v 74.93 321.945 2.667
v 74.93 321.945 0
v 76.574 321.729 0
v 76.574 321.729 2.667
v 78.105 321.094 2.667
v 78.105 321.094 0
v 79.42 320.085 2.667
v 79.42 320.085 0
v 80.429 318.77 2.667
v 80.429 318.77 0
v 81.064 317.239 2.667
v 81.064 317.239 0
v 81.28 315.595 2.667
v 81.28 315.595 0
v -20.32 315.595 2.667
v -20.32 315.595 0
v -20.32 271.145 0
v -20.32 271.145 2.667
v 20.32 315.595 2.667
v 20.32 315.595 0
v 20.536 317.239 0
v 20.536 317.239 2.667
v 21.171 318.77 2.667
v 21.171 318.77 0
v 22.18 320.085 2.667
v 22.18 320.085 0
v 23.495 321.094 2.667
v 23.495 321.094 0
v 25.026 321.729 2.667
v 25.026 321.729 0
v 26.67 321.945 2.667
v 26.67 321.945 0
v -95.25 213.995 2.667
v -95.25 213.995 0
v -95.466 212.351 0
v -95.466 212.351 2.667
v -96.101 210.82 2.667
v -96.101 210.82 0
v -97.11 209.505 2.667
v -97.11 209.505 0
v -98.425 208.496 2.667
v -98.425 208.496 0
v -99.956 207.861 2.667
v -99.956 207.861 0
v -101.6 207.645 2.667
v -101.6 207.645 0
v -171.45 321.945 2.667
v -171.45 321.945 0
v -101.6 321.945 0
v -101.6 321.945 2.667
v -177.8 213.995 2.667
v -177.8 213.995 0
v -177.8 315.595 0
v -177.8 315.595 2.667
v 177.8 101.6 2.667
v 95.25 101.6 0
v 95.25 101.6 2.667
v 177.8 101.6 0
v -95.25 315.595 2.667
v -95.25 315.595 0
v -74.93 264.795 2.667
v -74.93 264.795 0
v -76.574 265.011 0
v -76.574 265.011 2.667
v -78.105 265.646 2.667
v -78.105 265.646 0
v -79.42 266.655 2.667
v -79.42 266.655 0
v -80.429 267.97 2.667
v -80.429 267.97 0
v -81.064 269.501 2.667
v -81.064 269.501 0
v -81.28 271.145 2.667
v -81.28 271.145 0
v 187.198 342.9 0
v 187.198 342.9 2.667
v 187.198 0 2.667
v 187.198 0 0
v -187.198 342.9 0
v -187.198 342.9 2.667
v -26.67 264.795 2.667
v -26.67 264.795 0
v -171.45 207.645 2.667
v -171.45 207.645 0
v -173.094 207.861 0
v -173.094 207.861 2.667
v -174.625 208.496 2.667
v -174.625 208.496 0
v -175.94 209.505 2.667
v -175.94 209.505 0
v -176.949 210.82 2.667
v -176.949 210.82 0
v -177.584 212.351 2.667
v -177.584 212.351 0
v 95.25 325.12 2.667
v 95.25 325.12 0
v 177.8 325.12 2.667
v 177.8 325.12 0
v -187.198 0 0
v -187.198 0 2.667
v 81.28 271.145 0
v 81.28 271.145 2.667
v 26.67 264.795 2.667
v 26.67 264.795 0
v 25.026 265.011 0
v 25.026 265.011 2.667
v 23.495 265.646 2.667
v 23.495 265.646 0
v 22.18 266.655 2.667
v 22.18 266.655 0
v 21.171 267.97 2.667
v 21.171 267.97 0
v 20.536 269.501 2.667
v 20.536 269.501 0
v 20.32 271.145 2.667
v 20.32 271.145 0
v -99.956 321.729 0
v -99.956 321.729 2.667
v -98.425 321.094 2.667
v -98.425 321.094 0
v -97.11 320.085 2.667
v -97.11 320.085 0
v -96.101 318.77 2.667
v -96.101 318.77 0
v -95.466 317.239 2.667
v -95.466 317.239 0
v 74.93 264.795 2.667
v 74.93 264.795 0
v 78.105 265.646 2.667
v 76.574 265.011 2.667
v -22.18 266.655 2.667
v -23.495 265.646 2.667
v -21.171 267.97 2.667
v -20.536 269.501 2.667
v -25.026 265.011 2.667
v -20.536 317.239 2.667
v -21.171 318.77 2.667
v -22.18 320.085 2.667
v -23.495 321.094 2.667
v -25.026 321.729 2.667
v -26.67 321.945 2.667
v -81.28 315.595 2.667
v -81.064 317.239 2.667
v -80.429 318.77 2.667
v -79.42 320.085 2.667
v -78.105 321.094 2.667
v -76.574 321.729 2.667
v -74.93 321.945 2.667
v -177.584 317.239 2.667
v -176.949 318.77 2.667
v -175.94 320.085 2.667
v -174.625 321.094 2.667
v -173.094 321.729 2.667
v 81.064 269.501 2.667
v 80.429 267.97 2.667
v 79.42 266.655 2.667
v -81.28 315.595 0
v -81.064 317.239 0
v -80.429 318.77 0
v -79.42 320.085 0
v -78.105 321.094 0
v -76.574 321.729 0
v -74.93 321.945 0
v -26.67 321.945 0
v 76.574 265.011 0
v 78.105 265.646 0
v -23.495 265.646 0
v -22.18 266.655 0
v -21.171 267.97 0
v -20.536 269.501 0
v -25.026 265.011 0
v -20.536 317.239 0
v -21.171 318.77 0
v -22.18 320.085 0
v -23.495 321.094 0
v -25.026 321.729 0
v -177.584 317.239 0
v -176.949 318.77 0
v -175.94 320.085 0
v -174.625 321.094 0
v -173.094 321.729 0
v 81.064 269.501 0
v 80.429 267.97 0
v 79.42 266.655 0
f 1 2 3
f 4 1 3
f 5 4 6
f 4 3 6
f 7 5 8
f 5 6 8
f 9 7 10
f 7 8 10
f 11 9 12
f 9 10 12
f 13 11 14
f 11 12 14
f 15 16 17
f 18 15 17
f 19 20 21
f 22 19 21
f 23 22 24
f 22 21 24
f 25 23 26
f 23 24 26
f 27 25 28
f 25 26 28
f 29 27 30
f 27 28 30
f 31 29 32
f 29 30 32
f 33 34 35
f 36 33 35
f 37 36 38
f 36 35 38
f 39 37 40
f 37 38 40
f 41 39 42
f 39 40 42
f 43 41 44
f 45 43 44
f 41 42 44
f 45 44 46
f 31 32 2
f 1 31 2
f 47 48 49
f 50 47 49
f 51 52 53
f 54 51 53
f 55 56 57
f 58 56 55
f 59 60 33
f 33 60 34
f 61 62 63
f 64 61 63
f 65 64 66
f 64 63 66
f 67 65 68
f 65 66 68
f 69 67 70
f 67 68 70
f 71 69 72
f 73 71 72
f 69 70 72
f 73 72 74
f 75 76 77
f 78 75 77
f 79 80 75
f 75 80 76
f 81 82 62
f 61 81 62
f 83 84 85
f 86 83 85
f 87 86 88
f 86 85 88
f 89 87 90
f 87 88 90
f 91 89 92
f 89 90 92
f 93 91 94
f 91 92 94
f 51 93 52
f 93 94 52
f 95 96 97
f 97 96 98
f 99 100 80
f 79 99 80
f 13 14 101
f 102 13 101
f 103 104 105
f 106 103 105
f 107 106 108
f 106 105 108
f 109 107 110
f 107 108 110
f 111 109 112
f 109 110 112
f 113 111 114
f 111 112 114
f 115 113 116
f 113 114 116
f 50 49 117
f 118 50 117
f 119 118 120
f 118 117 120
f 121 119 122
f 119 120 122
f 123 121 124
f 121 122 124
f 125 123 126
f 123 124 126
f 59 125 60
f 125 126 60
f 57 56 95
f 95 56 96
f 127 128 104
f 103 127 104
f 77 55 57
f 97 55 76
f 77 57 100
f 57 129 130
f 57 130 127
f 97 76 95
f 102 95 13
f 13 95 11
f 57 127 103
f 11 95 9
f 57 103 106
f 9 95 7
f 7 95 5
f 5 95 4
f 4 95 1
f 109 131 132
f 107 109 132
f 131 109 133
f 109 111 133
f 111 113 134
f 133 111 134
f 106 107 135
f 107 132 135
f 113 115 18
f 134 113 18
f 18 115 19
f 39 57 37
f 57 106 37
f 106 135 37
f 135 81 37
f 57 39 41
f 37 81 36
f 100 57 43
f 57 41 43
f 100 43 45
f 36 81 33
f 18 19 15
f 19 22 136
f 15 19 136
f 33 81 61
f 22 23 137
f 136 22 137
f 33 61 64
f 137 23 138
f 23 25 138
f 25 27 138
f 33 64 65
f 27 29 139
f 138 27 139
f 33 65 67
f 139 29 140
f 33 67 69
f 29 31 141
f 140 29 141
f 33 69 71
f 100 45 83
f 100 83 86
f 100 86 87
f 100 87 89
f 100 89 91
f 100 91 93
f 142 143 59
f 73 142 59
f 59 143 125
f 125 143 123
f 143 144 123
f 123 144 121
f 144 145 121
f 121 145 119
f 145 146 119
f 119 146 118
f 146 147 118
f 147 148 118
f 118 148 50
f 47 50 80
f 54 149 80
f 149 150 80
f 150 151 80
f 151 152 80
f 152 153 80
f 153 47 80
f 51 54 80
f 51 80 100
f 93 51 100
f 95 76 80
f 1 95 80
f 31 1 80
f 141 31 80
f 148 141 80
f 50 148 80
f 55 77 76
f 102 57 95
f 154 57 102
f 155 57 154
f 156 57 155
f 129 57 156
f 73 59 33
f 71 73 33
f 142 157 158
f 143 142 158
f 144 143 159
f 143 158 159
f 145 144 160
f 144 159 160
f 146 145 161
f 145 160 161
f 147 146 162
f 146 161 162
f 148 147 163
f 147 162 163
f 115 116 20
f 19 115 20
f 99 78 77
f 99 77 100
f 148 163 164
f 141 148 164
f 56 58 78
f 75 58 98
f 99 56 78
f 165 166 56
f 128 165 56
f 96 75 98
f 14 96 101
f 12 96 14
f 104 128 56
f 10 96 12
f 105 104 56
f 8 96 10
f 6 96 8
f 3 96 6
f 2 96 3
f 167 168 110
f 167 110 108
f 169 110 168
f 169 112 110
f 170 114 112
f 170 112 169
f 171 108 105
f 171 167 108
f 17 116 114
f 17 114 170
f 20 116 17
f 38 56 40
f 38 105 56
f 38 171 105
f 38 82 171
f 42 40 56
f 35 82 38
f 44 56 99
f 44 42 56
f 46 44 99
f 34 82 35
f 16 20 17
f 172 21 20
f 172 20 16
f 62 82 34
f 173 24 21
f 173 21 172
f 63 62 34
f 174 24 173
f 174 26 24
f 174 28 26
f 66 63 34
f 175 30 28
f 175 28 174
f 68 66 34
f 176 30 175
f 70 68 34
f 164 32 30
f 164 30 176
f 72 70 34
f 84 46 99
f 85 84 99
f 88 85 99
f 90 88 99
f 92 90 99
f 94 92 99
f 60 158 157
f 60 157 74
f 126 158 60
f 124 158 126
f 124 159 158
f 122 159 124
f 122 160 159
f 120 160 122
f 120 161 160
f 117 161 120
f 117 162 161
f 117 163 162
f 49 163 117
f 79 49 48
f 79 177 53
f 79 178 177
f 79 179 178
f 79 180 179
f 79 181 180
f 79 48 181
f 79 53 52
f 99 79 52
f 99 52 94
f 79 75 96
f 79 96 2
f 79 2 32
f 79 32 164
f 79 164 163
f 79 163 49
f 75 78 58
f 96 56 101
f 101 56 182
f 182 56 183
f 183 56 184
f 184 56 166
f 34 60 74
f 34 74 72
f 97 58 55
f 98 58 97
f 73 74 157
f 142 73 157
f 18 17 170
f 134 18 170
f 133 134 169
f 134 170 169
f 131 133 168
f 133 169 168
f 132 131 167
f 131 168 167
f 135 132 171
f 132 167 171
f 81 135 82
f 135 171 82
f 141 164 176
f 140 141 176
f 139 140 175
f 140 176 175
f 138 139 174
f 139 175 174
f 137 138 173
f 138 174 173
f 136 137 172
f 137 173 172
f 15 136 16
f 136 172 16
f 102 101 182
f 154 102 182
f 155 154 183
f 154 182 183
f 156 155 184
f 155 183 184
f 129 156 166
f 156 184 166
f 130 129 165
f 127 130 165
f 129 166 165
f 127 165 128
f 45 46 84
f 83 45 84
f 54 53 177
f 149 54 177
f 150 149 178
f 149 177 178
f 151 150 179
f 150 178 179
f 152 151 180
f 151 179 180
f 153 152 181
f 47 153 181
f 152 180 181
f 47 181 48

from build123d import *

# Parameters (mm, degrees)
SKETCH1_W                   = 82.55
SKETCH1_H                   = 223.52
BOSS_EXTRUDE1_DEPTH         = 2.667
CORNERRADIUSALLOWANCE_DEPTH = 408.419998422


with BuildPart() as part:
    # Sketch1 → Boss-Extrude1 (new body)
    with BuildSketch(Plane.XY):
        with BuildLine():
            Line((-193.04, 0), (-193.04, 349.25))
            ThreePointArc((-193.04, 349.25), (0, 358.775), (193.04, 349.25))
            Line((193.04, 349.25), (193.04, 0))
            Line((193.04, 0), (-193.04, 0))
        make_face()
        with BuildLine():
            Line((74.93, 264.795), (26.67, 264.795))
            ThreePointArc((26.67, 264.795), (22.179871939, 266.654871939), (20.32, 271.145))
            Line((20.32, 271.145), (20.32, 315.595))
            ThreePointArc((20.32, 315.595), (22.179871939, 320.085128061), (26.67, 321.945))
            Line((26.67, 321.945), (74.93, 321.945))
            ThreePointArc((74.93, 321.945), (79.420128061, 320.085128061), (81.28, 315.595))
            Line((81.28, 315.595), (81.28, 271.145))
            ThreePointArc((81.28, 271.145), (79.420128061, 266.654871939), (74.93, 264.795))
        make_face(mode=Mode.SUBTRACT)
        with BuildLine():
            Line((-171.45, 321.945), (-101.6, 321.945))
            ThreePointArc((-101.6, 321.945), (-97.109871939, 320.085128061), (-95.25, 315.595))
            Line((-95.25, 315.595), (-95.25, 213.995))
            ThreePointArc((-95.25, 213.995), (-97.109871939, 209.504871939), (-101.6, 207.645))
            Line((-101.6, 207.645), (-171.45, 207.645))
            ThreePointArc((-171.45, 207.645), (-175.940128061, 209.504871939), (-177.8, 213.995))
            Line((-177.8, 213.995), (-177.8, 315.595))
            ThreePointArc((-177.8, 315.595), (-175.940128061, 320.085128061), (-171.45, 321.945))
        make_face(mode=Mode.SUBTRACT)
        with BuildLine():
            Line((-74.93, 321.945), (-26.67, 321.945))
            ThreePointArc((-26.67, 321.945), (-22.179871939, 320.085128061), (-20.32, 315.595))
            Line((-20.32, 315.595), (-20.32, 271.145))
            ThreePointArc((-20.32, 271.145), (-22.179871939, 266.654871939), (-26.67, 264.795))
            Line((-26.67, 264.795), (-74.93, 264.795))
            ThreePointArc((-74.93, 264.795), (-79.420128061, 266.654871939), (-81.28, 271.145))
            Line((-81.28, 271.145), (-81.28, 315.595))
            ThreePointArc((-81.28, 315.595), (-79.420128061, 320.085128061), (-74.93, 321.945))
        make_face(mode=Mode.SUBTRACT)
        with Locations((136.525, 213.36)):
            Rectangle(SKETCH1_W, SKETCH1_H, mode=Mode.SUBTRACT)
    extrude(amount=BOSS_EXTRUDE1_DEPTH)

    # Sketch2 → CornerRadiusAllowance (cut, through all)
    with BuildSketch(Plane.XY.offset(2.667)):
        with BuildLine():
            Line((-187.198, 0), (-187.198, 342.9))
            Line((-187.198, 342.9), (0, 342.9))
            Line((0, 342.9), (0, 358.775))
            ThreePointArc((0, 358.775), (-96.63742446, 356.392302388), (-193.04, 349.25))
            Line((-193.04, 349.25), (-193.04, 0))
            Line((-193.04, 0), (-187.198, 0))
        make_face()
        with BuildLine():
            Line((0, 358.775), (0, 342.9))
            Line((0, 342.9), (187.198, 342.9))
            Line((187.198, 342.9), (187.198, 0))
            Line((187.198, 0), (193.04, 0))
            Line((193.04, 0), (193.04, 349.25))
            ThreePointArc((193.04, 349.25), (96.63742446, 356.392302388), (0, 358.775))
        make_face()
    extrude(amount=-CORNERRADIUSALLOWANCE_DEPTH, mode=Mode.SUBTRACT)


solid = part.part
